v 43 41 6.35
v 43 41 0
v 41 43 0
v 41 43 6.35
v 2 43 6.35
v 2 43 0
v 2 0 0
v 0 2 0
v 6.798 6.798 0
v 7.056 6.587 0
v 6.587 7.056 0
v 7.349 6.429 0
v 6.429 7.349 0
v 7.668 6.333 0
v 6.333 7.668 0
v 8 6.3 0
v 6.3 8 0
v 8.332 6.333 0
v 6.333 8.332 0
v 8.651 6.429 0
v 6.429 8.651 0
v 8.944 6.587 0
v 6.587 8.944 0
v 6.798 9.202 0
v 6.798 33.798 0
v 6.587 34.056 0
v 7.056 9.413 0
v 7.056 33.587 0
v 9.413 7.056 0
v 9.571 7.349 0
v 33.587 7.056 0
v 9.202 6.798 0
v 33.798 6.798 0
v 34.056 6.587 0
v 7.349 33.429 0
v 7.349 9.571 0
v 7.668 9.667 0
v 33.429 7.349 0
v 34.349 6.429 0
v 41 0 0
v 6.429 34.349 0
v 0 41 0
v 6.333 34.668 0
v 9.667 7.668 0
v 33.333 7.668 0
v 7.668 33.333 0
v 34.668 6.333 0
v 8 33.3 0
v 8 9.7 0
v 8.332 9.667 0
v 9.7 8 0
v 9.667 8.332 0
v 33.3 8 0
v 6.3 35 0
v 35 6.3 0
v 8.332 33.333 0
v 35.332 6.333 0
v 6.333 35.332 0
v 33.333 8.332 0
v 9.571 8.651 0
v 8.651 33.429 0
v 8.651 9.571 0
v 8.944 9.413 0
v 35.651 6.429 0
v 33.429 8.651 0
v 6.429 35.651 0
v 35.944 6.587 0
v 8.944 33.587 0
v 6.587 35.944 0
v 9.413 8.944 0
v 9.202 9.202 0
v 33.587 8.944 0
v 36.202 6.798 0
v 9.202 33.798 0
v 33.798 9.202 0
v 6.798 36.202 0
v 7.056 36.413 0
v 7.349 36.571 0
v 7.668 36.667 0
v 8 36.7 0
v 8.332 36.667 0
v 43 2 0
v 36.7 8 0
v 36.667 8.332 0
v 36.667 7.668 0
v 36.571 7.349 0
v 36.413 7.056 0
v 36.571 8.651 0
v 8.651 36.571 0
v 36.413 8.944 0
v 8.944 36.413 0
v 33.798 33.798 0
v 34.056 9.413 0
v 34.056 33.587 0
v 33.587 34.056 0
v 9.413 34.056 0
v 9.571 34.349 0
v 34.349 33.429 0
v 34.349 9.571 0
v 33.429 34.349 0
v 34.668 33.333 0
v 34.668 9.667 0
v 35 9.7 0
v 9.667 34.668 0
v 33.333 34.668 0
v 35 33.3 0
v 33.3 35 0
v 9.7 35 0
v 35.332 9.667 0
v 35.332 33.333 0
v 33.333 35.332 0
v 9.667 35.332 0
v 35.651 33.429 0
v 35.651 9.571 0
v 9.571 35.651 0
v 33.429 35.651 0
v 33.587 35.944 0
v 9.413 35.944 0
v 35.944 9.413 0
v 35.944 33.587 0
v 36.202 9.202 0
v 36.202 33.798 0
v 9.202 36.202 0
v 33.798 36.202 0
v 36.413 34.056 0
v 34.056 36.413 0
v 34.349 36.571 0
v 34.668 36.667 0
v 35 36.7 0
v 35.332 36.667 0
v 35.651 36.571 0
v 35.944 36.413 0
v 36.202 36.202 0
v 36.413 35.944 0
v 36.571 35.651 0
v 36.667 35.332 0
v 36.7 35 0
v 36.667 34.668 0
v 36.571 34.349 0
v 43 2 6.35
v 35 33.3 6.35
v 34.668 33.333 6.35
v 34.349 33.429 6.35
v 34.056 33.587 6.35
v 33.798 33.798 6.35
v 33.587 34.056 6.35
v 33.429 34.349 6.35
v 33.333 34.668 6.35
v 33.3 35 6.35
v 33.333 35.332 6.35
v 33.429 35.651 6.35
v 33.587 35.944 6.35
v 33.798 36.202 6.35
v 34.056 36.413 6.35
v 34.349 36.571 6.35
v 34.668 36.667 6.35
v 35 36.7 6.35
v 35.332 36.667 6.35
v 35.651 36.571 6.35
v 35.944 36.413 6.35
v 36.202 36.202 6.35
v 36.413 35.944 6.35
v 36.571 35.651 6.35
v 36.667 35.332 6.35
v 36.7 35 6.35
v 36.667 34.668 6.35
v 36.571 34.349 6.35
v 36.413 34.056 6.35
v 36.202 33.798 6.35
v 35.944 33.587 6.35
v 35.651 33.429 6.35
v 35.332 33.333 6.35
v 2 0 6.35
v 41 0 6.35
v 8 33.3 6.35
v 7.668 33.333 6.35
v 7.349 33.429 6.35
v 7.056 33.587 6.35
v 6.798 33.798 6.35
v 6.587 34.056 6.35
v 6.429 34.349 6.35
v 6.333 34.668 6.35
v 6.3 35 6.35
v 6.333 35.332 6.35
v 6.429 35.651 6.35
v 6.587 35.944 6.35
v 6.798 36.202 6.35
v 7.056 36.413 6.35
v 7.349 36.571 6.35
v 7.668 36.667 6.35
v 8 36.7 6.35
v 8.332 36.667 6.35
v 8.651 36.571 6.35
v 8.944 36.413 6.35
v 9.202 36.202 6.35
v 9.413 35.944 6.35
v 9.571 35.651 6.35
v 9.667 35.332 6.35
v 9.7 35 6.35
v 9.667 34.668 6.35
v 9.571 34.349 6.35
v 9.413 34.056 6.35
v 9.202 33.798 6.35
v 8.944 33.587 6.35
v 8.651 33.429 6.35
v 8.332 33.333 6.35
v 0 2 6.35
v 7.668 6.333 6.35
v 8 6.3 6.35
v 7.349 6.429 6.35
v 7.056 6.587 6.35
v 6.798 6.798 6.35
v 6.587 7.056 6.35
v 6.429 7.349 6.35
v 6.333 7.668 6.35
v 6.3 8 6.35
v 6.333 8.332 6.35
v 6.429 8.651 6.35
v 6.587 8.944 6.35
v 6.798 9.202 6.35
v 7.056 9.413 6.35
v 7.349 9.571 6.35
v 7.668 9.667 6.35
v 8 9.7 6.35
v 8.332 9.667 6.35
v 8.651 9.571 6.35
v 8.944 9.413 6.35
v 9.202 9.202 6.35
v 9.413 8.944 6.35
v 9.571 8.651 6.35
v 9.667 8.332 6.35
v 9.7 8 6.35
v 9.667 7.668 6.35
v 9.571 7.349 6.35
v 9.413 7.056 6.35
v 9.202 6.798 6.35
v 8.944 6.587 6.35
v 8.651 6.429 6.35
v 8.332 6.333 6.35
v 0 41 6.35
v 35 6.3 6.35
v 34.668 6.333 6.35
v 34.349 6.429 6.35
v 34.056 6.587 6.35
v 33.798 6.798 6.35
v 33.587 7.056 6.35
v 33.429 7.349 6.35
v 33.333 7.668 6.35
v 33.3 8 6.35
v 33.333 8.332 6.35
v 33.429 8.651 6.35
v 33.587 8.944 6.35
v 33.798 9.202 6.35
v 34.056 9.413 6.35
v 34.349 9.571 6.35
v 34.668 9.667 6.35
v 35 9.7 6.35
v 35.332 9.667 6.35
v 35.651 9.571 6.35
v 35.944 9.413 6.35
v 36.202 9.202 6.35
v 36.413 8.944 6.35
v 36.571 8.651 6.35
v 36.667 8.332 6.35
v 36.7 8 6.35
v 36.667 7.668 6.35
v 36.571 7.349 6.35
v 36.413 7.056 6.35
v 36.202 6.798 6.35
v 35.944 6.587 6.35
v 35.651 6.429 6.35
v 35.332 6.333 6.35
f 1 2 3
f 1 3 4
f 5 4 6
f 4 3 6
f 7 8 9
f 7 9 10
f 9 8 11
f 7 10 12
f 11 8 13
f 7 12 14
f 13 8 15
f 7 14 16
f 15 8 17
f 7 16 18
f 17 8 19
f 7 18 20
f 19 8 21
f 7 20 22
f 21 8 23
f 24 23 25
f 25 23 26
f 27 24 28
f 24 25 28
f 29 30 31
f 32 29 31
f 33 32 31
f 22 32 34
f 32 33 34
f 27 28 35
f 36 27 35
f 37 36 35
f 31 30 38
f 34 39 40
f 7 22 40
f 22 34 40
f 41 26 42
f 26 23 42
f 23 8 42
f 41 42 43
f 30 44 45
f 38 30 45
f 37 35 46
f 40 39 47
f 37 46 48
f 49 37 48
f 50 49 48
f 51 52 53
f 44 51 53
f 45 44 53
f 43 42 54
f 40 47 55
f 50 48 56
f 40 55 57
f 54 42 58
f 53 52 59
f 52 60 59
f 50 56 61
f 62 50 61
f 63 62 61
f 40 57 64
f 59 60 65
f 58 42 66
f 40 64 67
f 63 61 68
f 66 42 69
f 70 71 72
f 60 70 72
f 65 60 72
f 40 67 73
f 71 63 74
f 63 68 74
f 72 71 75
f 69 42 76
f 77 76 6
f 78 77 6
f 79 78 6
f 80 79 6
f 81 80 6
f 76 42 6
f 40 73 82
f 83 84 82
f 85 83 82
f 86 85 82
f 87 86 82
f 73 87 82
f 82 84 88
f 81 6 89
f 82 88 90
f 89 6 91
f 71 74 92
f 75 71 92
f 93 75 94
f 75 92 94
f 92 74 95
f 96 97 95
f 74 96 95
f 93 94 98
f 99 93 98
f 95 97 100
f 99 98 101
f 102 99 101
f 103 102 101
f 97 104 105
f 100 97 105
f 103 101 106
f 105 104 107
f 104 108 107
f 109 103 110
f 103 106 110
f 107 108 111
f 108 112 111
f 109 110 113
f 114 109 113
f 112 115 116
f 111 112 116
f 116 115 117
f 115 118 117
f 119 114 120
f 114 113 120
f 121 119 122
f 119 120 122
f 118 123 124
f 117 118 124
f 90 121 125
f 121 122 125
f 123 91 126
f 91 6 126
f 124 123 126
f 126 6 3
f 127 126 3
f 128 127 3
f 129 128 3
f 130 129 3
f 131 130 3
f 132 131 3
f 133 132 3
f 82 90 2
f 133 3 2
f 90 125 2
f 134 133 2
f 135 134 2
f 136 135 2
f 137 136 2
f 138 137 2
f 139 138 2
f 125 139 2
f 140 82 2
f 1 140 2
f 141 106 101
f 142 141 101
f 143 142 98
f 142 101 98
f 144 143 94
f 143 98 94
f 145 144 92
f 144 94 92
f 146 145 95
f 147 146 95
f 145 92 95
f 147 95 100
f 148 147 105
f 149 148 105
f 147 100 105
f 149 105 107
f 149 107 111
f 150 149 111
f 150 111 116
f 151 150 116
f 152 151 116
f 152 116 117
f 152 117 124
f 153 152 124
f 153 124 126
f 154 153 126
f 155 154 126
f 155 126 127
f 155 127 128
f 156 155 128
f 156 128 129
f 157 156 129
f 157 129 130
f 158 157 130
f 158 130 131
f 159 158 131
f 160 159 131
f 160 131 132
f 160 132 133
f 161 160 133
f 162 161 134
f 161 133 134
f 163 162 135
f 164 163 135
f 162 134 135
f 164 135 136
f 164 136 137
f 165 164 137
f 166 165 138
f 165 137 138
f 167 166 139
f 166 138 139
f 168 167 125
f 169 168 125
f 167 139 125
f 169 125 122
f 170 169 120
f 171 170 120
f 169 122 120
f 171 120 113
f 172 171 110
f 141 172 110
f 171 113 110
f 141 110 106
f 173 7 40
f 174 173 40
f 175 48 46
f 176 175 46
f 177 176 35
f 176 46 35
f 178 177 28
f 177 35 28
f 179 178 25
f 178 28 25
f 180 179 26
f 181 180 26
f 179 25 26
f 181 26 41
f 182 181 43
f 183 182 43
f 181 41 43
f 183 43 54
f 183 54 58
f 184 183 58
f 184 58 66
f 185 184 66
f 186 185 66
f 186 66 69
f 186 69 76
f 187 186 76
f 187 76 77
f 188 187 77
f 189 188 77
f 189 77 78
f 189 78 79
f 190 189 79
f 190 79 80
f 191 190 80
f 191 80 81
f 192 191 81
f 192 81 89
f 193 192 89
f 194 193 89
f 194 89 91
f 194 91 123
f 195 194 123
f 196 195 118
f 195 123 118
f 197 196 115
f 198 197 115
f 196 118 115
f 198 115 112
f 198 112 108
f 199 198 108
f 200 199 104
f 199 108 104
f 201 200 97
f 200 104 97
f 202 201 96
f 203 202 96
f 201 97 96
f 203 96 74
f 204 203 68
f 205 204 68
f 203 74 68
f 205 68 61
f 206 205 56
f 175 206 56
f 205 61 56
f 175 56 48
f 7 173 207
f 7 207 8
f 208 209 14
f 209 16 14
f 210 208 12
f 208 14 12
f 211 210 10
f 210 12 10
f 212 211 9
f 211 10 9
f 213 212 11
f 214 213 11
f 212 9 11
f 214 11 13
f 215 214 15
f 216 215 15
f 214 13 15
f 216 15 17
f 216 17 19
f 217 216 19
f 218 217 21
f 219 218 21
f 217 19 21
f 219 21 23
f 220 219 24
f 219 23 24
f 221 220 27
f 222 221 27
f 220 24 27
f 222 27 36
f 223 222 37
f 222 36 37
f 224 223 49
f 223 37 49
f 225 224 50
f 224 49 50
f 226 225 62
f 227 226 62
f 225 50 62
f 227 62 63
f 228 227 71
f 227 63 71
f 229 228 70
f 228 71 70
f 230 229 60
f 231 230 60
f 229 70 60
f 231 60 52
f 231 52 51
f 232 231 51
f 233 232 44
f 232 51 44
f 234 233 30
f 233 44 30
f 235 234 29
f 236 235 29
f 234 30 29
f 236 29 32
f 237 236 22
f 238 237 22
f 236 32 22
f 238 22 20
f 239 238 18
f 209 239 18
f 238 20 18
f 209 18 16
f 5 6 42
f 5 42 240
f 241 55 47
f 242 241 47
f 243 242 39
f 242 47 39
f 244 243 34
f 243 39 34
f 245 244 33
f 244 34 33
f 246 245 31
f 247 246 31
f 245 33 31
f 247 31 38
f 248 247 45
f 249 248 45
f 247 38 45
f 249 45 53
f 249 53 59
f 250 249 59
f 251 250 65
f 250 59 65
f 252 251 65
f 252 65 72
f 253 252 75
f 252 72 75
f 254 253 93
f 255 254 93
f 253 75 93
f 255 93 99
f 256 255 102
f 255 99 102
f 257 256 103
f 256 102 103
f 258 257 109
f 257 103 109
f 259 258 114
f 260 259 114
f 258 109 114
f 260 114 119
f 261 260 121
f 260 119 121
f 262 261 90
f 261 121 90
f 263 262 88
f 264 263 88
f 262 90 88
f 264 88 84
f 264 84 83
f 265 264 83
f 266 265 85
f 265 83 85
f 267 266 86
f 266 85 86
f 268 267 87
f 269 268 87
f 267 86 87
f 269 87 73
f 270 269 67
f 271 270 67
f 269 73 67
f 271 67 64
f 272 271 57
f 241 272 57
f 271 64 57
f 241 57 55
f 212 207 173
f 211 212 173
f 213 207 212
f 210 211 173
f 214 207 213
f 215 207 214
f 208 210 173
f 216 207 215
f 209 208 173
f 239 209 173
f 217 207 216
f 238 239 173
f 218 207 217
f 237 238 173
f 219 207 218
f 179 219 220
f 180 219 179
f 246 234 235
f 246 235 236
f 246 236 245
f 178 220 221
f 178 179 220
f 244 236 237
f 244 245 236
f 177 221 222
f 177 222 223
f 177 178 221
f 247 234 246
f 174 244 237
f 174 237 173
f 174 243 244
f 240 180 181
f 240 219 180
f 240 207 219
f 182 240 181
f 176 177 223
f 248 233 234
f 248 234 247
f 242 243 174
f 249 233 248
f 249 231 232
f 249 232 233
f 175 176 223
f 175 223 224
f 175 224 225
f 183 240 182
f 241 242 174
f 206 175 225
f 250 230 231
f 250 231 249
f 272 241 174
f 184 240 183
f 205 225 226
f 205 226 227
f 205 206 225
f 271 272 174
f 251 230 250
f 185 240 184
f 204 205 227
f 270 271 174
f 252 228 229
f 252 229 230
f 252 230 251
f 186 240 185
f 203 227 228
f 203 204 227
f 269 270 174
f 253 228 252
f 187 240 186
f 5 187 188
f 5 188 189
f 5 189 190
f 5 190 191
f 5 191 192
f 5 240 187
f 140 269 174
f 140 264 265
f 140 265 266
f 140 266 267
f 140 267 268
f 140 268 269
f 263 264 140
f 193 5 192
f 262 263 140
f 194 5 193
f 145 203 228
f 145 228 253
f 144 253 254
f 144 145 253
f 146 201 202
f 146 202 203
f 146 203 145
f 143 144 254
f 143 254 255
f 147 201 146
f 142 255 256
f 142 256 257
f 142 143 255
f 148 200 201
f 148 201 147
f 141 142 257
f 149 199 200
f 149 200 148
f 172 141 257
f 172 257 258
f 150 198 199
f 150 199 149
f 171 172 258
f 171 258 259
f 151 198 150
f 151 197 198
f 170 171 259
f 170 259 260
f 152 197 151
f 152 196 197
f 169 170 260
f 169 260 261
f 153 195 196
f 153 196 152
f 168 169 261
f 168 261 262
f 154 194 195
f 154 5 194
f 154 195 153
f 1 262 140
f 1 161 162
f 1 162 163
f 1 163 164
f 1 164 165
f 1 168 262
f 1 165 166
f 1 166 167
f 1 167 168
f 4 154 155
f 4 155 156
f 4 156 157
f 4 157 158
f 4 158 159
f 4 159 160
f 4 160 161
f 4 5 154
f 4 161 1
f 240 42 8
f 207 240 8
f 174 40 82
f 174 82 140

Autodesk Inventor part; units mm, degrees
ref_plane "YZ Plane" through (0, 0, 0) normal (1, 0, 0) x (0, 1, 0)
ref_plane "XZ Plane" through (0, 0, 0) normal (0, 1, 0) x (-1, 0, 0)
ref_plane "XY Plane" through (0, 0, 0) normal (0, 0, 1) x (1, 0, 0)
sketch "Sketch1" plane through (0, 0, 0) normal (0, 0, 1) x (1, 0, 0)
  line L0 (0, 0) -> (43, 0)
  line L1 (43, 0) -> (43, 43)
  line L2 (43, 43) -> (0, 43)
  line L3 (0, 43) -> (0, 0)
  dimension "d0" = 43
  dimension "d1" = 43
extrude "Extrusion1" add sketch "Sketch1" along normal blind 6.35
chamfer "Chamfer1" distance 2 angle 45 4 edges at (43, 43, 3.175) (43, 0, 3.175) (0, 43, 3.175) (0, 0, 3.175)
sketch "Sketch2" plane through (0, 0, 6.35) normal (0, 0, 1) x (1, 0, 0)
  line L0 (0, 41) -> (0, 2) projected
  line L1 (43, 2) -> (43, 41) projected
  line L2 (2, 0) -> (41, 0) projected
  line L3 (41, 43) -> (2, 43) projected
  point P0 (0, 0)
  point P1 (8, 8)
  point P2 (35, 8)
  point P3 (35, 35)
  point P4 (8, 35)
  dimension "d7" = 8
  dimension "d8" = 8
  dimension "d9" = 8
  dimension "d10" = 8
  dimension "d11" = 8
  dimension "d12" = 8
hole "Hole1" at (8, 8, 6.35) at (35, 8, 6.35) at (35, 35, 6.35) at (8, 35, 6.35) direction (0, 0, -1) diameter 3.4 depth 7 tip angle 118 clearance for "Flat Head Machine Screw" size "M3" standard "Ansi Metric M Profile"
ref_plane "Work Plane1" through (2, 21.5, 0) normal (0, 1, 0) x (1, 0, 0)
ref_plane "Work Plane2" through (21.5, 2, 0) normal (-1, 0, 0) x (0, 0, 1)
properties part number "Front Armor" material "Polyethylene, High Density"
